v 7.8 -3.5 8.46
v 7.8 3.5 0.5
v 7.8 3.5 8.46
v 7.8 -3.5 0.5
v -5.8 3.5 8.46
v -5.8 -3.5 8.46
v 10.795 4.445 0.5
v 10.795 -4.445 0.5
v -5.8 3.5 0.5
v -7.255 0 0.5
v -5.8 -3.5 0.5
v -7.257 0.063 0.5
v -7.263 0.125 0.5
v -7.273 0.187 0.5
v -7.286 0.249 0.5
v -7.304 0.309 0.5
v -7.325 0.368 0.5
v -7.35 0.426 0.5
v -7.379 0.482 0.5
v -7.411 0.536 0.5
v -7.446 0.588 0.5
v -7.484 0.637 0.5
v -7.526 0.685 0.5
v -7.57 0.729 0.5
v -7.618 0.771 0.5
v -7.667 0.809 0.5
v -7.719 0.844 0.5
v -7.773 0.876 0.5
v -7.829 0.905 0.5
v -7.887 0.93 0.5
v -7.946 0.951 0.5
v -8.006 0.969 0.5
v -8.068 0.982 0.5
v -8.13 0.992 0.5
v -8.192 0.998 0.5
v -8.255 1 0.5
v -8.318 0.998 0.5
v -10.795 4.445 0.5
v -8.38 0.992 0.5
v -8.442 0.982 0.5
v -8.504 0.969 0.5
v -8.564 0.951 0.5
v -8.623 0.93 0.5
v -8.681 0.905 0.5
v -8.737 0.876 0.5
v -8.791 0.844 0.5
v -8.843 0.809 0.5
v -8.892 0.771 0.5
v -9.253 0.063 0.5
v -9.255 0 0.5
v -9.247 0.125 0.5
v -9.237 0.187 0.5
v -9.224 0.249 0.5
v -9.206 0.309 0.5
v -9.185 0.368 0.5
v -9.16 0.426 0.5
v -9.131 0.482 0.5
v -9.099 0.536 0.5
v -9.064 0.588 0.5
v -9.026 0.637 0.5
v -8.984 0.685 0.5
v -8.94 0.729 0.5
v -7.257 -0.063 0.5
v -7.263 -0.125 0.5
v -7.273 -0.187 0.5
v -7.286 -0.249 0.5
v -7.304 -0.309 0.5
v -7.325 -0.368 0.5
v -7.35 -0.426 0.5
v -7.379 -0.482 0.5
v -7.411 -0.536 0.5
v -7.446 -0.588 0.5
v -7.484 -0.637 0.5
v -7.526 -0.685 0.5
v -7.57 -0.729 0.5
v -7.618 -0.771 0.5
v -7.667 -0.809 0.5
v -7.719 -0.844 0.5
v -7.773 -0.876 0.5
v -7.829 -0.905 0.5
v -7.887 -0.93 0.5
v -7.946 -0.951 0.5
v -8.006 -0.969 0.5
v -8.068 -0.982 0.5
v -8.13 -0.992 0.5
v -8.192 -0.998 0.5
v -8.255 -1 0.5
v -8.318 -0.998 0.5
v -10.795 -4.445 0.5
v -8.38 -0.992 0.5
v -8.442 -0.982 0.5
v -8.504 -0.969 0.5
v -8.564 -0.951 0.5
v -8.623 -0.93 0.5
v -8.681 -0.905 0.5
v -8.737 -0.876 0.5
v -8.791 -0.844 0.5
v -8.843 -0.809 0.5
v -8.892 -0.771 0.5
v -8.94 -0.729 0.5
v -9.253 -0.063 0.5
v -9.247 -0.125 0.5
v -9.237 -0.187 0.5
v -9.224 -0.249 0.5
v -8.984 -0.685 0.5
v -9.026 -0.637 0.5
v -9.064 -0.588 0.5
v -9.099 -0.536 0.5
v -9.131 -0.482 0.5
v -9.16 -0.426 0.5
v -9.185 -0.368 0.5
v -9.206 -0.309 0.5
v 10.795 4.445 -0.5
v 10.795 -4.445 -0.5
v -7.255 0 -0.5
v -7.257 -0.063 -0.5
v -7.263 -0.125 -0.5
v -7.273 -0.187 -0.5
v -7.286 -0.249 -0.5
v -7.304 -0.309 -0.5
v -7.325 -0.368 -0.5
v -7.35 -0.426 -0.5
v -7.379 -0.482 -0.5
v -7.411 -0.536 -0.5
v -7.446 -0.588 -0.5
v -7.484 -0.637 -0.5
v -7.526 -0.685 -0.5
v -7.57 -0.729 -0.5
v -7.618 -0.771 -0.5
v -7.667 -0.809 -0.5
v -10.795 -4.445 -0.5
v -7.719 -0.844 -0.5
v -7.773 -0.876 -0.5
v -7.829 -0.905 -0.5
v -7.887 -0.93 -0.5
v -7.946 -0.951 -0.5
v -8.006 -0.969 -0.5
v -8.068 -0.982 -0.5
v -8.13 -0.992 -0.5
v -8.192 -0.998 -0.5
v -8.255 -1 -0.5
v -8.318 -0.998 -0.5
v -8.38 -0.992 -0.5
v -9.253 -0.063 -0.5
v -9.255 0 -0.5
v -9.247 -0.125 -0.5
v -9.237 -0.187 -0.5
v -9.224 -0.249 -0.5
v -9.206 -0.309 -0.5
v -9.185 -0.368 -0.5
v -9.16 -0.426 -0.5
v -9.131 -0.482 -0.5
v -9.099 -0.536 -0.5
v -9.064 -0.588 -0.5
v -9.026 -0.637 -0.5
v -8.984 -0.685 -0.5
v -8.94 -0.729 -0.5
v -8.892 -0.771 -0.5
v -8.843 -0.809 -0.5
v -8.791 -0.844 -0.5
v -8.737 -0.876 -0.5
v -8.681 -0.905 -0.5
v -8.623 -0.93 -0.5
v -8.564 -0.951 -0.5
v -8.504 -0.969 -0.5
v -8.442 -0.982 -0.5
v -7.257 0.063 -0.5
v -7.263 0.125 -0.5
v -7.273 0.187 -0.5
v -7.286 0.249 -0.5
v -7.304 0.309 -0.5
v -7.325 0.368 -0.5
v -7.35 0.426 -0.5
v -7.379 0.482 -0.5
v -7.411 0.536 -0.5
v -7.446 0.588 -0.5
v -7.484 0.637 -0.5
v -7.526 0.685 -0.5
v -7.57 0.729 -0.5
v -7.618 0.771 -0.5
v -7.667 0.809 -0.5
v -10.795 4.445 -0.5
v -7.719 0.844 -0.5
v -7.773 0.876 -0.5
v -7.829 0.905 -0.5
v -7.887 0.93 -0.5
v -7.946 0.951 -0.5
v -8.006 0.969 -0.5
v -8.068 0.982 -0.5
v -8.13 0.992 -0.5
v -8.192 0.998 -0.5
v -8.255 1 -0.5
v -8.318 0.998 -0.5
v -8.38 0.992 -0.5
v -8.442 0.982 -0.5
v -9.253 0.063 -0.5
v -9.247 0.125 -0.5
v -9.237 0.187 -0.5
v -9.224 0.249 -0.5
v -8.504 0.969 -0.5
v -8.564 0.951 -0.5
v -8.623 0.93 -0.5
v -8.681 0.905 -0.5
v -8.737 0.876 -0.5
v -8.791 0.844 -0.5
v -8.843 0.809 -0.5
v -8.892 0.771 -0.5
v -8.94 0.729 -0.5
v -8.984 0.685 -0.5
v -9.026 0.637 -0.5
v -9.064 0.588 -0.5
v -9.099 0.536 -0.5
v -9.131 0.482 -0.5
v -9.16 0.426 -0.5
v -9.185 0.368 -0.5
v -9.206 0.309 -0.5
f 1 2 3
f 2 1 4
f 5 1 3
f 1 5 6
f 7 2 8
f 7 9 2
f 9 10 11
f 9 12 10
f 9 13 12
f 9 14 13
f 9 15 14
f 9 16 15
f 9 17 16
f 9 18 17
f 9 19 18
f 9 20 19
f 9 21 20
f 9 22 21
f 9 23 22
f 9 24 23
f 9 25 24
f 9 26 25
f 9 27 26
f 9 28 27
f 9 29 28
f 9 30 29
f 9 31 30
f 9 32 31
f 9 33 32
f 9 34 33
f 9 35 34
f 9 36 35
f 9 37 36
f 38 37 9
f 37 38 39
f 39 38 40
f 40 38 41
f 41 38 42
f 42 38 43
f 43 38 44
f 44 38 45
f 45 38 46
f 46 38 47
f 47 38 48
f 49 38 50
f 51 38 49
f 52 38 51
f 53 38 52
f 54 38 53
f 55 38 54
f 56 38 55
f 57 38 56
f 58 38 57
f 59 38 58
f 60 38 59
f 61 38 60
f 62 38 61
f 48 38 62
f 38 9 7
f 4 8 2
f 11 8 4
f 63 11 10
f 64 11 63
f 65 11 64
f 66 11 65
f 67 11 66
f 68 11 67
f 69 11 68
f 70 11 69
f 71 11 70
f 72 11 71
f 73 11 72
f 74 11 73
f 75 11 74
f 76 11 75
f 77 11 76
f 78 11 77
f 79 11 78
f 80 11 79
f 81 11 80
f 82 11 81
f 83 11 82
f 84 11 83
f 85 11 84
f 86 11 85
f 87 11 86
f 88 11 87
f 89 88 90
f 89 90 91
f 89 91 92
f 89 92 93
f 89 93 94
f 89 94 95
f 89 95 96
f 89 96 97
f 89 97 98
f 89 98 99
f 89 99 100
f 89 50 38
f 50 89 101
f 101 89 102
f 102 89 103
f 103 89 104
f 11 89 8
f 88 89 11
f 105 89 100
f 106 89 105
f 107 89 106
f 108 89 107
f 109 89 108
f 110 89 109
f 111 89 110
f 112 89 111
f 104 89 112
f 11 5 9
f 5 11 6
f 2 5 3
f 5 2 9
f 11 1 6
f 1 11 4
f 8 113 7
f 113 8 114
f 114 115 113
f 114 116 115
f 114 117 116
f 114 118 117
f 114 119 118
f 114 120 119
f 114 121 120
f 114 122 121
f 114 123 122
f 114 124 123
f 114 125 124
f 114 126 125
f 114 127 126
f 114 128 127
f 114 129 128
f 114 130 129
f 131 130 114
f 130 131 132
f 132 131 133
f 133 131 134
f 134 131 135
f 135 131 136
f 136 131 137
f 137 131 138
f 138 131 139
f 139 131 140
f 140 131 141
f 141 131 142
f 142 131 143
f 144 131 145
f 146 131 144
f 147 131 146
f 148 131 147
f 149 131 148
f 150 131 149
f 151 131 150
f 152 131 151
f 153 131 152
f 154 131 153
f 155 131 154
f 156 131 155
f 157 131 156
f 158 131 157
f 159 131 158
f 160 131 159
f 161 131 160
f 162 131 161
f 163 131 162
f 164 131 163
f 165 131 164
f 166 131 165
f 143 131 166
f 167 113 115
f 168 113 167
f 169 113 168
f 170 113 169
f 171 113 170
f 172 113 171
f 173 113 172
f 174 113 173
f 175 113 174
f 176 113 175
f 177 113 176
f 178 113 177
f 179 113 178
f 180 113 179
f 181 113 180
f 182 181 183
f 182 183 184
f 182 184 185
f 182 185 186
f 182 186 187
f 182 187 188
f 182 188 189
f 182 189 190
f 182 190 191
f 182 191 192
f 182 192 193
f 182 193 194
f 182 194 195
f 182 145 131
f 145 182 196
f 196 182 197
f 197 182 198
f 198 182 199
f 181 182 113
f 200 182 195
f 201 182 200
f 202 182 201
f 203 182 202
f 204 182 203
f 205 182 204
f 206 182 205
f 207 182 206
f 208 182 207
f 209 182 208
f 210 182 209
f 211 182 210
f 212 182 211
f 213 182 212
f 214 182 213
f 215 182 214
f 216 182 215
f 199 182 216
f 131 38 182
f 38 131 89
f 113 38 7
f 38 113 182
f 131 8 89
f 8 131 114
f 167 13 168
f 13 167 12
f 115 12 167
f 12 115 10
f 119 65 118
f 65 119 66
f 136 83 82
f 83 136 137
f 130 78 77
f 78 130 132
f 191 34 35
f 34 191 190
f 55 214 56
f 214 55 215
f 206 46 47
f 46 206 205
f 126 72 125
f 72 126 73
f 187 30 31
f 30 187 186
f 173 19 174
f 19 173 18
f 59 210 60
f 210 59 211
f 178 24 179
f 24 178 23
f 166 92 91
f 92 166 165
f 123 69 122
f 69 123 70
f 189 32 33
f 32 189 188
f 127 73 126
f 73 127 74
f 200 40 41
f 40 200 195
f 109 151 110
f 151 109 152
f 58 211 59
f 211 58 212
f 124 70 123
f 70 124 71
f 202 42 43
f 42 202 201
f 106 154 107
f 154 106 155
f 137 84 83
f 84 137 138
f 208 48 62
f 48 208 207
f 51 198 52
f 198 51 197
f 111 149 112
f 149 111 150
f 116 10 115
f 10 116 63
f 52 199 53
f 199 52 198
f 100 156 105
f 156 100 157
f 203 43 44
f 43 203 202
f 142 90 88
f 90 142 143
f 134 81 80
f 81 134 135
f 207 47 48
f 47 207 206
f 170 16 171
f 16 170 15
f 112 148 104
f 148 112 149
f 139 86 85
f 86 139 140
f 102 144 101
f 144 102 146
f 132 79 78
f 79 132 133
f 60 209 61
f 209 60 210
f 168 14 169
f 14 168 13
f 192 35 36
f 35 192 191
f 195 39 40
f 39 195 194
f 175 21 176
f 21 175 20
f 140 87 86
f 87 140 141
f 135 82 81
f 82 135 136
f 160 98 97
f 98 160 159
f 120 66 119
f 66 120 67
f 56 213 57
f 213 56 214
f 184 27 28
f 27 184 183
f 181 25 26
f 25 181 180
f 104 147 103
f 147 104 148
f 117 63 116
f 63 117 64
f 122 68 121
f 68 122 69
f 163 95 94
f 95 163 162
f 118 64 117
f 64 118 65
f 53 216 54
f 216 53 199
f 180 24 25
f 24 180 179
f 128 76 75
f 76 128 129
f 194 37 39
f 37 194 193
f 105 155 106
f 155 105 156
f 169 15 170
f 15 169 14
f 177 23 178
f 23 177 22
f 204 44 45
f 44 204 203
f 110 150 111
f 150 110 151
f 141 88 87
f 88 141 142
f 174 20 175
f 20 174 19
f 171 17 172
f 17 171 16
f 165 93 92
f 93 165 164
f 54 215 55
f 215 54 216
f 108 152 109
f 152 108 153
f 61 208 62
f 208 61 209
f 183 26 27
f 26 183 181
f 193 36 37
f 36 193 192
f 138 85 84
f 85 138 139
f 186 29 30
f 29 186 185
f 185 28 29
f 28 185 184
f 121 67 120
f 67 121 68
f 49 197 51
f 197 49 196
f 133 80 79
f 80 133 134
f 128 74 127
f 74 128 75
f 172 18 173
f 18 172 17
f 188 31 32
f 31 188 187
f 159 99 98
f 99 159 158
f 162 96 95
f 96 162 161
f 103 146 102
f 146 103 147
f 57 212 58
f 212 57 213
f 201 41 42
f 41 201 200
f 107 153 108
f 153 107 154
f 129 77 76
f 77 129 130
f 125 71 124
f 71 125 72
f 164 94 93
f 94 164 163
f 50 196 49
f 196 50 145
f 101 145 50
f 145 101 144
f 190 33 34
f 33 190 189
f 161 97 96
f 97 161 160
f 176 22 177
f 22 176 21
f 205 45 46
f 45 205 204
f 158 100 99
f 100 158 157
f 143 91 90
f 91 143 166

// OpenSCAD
//Pololu drv8838 single brushed DC motor driver carrier

//https://www.pololu.com/product/1132
//GP2Y0D805Z0F Digital Distance Sensor 5cm
module make_pololu_GP2Y0D805Z0F(height_extend=0, sensor_buffer=0, board_bb=0, x_extend=0, x_offset=0, y_extend=0, hole_offset=0){

    sensor_height = 7.96 + height_extend;

	difference(){
		union(){
    	    //sensor
    	    translate([+1, 0, sensor_height/2+1/2])
    	    cube([13.6+sensor_buffer, 7+sensor_buffer, sensor_height], center=true);
    	    
    	    //board
    	    translate([x_offset, 0, (board_bb==1)?100/2+1/2:0])
    	    cube([21.59+x_extend, 8.89+y_extend, (board_bb==1)?100:1], center=true);
		}
	    
	    //hole
	    translate([+21.59/2-19.05+hole_offset,0,0])
	    cylinder(d=2, h=10, center=true, $fn=100);
	}
}

make_pololu_GP2Y0D805Z0F();
